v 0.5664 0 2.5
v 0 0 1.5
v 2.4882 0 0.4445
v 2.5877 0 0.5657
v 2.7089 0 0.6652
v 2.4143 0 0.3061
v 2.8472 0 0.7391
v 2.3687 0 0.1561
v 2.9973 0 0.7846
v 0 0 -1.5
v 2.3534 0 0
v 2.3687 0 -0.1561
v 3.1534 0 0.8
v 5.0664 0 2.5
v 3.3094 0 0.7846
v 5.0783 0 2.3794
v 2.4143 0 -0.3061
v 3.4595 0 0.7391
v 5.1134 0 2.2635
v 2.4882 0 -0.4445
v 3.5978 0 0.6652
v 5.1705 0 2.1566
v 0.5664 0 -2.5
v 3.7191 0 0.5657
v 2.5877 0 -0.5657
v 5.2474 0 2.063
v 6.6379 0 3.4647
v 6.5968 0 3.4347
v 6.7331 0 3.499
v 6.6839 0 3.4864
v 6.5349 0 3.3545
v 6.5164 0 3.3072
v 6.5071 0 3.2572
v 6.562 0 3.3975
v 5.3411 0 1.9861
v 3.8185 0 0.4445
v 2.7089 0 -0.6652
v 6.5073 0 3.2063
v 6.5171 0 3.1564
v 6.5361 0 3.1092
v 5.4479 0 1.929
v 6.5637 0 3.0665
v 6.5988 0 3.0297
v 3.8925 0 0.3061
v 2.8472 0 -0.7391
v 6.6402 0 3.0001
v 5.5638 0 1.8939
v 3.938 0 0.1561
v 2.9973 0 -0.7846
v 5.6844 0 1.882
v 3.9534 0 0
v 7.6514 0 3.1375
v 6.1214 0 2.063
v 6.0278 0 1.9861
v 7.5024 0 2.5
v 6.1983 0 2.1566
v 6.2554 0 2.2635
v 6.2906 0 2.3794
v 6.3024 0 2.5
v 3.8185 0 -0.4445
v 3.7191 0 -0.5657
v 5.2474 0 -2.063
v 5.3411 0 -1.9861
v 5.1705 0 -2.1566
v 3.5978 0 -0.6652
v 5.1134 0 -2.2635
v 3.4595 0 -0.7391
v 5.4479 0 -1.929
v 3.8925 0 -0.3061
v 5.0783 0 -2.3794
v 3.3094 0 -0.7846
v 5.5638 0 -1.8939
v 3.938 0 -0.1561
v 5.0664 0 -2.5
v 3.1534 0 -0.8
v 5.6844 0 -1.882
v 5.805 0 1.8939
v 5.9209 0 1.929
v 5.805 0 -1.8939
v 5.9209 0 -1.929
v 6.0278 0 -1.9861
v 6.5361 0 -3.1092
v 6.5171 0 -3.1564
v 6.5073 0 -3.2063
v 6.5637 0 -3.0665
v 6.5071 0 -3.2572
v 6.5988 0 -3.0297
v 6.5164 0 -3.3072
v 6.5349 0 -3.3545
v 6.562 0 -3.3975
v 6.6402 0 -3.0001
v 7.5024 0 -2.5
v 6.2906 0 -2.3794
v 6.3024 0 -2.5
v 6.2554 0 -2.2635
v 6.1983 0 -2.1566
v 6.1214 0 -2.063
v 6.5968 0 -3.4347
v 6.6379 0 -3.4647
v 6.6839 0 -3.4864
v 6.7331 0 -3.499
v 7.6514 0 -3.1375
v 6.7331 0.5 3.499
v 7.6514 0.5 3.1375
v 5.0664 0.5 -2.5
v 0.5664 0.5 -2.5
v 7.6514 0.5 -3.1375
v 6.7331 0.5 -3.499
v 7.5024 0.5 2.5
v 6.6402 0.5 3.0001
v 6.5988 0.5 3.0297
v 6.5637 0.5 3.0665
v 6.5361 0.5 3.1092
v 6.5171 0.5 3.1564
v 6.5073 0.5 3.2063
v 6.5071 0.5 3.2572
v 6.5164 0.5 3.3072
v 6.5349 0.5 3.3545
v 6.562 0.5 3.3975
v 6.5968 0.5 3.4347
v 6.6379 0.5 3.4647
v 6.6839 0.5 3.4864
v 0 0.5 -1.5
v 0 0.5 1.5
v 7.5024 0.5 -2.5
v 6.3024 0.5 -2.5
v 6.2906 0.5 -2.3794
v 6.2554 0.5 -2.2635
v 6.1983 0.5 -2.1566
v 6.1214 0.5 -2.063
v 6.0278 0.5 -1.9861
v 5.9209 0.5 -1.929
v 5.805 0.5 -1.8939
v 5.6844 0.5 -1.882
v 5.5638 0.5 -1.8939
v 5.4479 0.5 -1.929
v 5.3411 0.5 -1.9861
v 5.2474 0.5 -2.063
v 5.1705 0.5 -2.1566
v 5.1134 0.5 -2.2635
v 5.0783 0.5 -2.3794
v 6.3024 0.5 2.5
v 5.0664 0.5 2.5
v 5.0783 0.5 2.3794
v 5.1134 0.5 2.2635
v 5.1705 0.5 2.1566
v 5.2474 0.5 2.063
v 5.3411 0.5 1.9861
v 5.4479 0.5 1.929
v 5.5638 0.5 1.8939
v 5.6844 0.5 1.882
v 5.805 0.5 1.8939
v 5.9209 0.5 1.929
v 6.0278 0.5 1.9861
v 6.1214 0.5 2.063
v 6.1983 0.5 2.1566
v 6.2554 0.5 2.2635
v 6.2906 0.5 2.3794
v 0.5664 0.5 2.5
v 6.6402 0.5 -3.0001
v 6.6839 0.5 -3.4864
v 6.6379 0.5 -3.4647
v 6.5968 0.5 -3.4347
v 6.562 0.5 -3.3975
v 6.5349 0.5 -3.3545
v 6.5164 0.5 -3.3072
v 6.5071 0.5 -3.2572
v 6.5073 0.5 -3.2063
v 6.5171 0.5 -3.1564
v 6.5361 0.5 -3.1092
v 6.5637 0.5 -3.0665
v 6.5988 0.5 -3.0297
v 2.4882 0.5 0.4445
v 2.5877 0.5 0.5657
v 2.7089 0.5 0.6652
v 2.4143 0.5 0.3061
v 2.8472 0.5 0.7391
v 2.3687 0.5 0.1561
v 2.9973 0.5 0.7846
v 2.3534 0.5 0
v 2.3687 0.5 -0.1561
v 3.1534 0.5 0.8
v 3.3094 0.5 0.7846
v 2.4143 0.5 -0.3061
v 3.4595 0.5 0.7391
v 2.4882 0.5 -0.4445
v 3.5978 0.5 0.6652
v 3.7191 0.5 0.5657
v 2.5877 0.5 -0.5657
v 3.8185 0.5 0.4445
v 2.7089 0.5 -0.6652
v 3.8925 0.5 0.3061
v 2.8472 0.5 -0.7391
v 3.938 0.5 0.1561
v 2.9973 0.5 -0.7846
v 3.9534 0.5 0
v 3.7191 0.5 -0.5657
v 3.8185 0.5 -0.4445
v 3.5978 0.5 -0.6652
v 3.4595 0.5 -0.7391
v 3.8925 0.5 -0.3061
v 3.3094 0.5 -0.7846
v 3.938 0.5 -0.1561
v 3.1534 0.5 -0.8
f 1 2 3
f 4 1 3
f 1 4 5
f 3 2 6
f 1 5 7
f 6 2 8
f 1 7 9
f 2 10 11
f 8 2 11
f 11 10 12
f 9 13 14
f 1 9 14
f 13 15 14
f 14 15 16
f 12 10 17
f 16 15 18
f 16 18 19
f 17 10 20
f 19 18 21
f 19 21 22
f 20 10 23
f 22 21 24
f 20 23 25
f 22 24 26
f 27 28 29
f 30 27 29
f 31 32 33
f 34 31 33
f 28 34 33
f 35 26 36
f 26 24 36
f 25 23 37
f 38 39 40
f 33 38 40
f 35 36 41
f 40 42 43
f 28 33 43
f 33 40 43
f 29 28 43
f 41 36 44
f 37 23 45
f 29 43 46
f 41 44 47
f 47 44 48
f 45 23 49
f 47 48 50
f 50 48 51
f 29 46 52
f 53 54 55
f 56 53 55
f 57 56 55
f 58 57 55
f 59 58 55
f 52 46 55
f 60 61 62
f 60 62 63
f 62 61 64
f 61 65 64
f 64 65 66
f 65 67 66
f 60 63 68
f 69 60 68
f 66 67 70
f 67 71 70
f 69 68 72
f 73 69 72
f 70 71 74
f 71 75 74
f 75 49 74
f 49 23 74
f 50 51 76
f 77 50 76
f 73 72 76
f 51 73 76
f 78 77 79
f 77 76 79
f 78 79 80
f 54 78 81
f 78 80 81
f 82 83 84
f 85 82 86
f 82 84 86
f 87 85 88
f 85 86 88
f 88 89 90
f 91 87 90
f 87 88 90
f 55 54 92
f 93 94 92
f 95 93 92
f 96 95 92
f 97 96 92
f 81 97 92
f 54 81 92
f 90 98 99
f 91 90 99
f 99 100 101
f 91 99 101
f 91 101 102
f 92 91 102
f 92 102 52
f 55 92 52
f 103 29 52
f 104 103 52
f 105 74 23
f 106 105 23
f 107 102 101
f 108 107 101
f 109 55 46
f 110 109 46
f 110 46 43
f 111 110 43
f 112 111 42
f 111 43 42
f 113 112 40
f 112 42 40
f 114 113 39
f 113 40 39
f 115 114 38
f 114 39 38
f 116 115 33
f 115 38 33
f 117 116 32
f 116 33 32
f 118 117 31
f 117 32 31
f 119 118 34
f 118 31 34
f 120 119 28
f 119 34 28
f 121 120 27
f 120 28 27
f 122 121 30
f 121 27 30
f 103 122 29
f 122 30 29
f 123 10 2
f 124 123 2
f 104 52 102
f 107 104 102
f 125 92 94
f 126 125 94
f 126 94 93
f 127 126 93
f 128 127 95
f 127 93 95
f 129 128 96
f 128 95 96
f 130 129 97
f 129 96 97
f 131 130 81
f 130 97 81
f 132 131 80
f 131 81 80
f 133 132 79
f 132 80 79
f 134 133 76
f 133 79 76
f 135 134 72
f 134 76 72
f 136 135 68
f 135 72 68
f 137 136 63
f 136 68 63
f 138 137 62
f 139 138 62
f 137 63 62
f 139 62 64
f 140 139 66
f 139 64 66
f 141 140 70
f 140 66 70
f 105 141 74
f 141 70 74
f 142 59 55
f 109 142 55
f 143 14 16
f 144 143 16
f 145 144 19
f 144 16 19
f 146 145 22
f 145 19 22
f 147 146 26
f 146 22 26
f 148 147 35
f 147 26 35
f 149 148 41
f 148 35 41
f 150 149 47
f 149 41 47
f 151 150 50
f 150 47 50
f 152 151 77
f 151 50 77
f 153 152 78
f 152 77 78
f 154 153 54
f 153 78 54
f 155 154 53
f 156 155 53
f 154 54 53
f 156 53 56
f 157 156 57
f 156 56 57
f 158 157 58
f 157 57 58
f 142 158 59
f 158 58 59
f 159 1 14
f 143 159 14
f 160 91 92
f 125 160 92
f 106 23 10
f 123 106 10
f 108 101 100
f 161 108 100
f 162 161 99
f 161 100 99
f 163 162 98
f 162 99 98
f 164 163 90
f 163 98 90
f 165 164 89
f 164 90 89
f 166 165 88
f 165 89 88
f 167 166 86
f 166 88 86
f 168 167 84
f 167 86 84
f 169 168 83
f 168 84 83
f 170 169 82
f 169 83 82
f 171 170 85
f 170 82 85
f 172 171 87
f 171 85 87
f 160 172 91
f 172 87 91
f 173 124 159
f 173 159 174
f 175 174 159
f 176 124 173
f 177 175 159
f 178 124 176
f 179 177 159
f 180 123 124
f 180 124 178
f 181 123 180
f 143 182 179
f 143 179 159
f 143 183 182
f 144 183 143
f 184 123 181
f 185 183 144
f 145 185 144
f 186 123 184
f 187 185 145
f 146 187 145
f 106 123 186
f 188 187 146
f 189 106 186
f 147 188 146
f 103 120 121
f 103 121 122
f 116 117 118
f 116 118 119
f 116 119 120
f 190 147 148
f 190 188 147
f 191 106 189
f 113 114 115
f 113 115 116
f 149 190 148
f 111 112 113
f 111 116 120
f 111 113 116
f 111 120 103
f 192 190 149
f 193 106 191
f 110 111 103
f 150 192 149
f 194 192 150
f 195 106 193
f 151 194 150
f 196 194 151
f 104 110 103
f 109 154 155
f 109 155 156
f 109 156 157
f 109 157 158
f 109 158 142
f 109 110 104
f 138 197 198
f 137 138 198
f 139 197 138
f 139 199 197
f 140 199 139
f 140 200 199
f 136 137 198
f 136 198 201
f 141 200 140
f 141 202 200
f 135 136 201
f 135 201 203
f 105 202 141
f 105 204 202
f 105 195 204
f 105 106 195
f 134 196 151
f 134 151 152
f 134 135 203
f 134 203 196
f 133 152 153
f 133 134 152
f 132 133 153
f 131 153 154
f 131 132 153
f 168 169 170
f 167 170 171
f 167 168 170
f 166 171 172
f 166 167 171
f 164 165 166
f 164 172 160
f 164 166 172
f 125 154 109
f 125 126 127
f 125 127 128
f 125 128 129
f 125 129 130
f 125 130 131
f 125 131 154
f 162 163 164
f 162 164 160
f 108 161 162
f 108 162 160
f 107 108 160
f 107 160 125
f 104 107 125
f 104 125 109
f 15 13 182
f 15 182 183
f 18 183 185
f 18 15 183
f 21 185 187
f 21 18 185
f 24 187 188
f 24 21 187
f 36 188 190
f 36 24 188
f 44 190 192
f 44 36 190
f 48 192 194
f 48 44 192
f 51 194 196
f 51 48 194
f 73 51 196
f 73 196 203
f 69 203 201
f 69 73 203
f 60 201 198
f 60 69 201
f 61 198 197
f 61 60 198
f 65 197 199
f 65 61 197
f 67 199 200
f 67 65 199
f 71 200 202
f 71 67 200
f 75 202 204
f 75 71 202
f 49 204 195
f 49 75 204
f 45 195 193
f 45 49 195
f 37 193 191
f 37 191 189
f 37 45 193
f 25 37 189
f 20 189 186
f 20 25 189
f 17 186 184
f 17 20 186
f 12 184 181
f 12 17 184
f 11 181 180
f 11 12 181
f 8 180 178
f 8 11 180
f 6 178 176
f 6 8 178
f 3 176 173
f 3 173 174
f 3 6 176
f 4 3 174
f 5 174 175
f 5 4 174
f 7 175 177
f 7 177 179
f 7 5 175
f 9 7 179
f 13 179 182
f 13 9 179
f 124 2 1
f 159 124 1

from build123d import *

# Parameters (mm, degrees)
SKETCH1_R           = 0.8
BOSS_EXTRUDE1_DEPTH = 0.5


with BuildPart() as part:
    # Sketch1 → Boss-Extrude1 (new body)
    with BuildSketch(Plane(origin=(0, 0, 0), x_dir=(1, 0, 0), z_dir=(0, 1, 0))):
        with BuildLine():
            Line((0, 1.5), (0, -1.5))
            Line((0, -1.5), (0.566386859, -2.5))
            Line((0.566386859, -2.5), (5.066386859, -2.5))
            ThreePointArc((5.066386859, -2.5), (5.684410747, -1.881976112), (6.302434635, -2.5))
            Line((6.302434635, -2.5), (7.502434635, -2.5))
            Line((7.502434635, -2.5), (6.640167687, -3.000108496))
            ThreePointArc((6.640167687, -3.000108496), (6.510535737, -3.282386176), (6.733125956, -3.499039646))
            Line((6.733125956, -3.499039646), (7.651443218, -3.137476564))
            Line((7.651443218, -3.137476564), (7.651443218, 3.137476564))
            Line((7.651443218, 3.137476564), (6.733125956, 3.499039646))
            ThreePointArc((6.733125956, 3.499039646), (6.510535737, 3.282386176), (6.640167687, 3.000108496))
            Line((6.640167687, 3.000108496), (7.502434635, 2.5))
            Line((7.502434635, 2.5), (6.302434635, 2.5))
            ThreePointArc((6.302434635, 2.5), (5.684410747, 1.881976112), (5.066386859, 2.5))
            Line((5.066386859, 2.5), (0.566386859, 2.5))
            Line((0.566386859, 2.5), (0, 1.5))
        make_face()
        with Locations(Location((3.153366843, 0, 0), (0, 0, 270))):
            Circle(SKETCH1_R, mode=Mode.SUBTRACT)
    extrude(amount=BOSS_EXTRUDE1_DEPTH)


solid = part.part
